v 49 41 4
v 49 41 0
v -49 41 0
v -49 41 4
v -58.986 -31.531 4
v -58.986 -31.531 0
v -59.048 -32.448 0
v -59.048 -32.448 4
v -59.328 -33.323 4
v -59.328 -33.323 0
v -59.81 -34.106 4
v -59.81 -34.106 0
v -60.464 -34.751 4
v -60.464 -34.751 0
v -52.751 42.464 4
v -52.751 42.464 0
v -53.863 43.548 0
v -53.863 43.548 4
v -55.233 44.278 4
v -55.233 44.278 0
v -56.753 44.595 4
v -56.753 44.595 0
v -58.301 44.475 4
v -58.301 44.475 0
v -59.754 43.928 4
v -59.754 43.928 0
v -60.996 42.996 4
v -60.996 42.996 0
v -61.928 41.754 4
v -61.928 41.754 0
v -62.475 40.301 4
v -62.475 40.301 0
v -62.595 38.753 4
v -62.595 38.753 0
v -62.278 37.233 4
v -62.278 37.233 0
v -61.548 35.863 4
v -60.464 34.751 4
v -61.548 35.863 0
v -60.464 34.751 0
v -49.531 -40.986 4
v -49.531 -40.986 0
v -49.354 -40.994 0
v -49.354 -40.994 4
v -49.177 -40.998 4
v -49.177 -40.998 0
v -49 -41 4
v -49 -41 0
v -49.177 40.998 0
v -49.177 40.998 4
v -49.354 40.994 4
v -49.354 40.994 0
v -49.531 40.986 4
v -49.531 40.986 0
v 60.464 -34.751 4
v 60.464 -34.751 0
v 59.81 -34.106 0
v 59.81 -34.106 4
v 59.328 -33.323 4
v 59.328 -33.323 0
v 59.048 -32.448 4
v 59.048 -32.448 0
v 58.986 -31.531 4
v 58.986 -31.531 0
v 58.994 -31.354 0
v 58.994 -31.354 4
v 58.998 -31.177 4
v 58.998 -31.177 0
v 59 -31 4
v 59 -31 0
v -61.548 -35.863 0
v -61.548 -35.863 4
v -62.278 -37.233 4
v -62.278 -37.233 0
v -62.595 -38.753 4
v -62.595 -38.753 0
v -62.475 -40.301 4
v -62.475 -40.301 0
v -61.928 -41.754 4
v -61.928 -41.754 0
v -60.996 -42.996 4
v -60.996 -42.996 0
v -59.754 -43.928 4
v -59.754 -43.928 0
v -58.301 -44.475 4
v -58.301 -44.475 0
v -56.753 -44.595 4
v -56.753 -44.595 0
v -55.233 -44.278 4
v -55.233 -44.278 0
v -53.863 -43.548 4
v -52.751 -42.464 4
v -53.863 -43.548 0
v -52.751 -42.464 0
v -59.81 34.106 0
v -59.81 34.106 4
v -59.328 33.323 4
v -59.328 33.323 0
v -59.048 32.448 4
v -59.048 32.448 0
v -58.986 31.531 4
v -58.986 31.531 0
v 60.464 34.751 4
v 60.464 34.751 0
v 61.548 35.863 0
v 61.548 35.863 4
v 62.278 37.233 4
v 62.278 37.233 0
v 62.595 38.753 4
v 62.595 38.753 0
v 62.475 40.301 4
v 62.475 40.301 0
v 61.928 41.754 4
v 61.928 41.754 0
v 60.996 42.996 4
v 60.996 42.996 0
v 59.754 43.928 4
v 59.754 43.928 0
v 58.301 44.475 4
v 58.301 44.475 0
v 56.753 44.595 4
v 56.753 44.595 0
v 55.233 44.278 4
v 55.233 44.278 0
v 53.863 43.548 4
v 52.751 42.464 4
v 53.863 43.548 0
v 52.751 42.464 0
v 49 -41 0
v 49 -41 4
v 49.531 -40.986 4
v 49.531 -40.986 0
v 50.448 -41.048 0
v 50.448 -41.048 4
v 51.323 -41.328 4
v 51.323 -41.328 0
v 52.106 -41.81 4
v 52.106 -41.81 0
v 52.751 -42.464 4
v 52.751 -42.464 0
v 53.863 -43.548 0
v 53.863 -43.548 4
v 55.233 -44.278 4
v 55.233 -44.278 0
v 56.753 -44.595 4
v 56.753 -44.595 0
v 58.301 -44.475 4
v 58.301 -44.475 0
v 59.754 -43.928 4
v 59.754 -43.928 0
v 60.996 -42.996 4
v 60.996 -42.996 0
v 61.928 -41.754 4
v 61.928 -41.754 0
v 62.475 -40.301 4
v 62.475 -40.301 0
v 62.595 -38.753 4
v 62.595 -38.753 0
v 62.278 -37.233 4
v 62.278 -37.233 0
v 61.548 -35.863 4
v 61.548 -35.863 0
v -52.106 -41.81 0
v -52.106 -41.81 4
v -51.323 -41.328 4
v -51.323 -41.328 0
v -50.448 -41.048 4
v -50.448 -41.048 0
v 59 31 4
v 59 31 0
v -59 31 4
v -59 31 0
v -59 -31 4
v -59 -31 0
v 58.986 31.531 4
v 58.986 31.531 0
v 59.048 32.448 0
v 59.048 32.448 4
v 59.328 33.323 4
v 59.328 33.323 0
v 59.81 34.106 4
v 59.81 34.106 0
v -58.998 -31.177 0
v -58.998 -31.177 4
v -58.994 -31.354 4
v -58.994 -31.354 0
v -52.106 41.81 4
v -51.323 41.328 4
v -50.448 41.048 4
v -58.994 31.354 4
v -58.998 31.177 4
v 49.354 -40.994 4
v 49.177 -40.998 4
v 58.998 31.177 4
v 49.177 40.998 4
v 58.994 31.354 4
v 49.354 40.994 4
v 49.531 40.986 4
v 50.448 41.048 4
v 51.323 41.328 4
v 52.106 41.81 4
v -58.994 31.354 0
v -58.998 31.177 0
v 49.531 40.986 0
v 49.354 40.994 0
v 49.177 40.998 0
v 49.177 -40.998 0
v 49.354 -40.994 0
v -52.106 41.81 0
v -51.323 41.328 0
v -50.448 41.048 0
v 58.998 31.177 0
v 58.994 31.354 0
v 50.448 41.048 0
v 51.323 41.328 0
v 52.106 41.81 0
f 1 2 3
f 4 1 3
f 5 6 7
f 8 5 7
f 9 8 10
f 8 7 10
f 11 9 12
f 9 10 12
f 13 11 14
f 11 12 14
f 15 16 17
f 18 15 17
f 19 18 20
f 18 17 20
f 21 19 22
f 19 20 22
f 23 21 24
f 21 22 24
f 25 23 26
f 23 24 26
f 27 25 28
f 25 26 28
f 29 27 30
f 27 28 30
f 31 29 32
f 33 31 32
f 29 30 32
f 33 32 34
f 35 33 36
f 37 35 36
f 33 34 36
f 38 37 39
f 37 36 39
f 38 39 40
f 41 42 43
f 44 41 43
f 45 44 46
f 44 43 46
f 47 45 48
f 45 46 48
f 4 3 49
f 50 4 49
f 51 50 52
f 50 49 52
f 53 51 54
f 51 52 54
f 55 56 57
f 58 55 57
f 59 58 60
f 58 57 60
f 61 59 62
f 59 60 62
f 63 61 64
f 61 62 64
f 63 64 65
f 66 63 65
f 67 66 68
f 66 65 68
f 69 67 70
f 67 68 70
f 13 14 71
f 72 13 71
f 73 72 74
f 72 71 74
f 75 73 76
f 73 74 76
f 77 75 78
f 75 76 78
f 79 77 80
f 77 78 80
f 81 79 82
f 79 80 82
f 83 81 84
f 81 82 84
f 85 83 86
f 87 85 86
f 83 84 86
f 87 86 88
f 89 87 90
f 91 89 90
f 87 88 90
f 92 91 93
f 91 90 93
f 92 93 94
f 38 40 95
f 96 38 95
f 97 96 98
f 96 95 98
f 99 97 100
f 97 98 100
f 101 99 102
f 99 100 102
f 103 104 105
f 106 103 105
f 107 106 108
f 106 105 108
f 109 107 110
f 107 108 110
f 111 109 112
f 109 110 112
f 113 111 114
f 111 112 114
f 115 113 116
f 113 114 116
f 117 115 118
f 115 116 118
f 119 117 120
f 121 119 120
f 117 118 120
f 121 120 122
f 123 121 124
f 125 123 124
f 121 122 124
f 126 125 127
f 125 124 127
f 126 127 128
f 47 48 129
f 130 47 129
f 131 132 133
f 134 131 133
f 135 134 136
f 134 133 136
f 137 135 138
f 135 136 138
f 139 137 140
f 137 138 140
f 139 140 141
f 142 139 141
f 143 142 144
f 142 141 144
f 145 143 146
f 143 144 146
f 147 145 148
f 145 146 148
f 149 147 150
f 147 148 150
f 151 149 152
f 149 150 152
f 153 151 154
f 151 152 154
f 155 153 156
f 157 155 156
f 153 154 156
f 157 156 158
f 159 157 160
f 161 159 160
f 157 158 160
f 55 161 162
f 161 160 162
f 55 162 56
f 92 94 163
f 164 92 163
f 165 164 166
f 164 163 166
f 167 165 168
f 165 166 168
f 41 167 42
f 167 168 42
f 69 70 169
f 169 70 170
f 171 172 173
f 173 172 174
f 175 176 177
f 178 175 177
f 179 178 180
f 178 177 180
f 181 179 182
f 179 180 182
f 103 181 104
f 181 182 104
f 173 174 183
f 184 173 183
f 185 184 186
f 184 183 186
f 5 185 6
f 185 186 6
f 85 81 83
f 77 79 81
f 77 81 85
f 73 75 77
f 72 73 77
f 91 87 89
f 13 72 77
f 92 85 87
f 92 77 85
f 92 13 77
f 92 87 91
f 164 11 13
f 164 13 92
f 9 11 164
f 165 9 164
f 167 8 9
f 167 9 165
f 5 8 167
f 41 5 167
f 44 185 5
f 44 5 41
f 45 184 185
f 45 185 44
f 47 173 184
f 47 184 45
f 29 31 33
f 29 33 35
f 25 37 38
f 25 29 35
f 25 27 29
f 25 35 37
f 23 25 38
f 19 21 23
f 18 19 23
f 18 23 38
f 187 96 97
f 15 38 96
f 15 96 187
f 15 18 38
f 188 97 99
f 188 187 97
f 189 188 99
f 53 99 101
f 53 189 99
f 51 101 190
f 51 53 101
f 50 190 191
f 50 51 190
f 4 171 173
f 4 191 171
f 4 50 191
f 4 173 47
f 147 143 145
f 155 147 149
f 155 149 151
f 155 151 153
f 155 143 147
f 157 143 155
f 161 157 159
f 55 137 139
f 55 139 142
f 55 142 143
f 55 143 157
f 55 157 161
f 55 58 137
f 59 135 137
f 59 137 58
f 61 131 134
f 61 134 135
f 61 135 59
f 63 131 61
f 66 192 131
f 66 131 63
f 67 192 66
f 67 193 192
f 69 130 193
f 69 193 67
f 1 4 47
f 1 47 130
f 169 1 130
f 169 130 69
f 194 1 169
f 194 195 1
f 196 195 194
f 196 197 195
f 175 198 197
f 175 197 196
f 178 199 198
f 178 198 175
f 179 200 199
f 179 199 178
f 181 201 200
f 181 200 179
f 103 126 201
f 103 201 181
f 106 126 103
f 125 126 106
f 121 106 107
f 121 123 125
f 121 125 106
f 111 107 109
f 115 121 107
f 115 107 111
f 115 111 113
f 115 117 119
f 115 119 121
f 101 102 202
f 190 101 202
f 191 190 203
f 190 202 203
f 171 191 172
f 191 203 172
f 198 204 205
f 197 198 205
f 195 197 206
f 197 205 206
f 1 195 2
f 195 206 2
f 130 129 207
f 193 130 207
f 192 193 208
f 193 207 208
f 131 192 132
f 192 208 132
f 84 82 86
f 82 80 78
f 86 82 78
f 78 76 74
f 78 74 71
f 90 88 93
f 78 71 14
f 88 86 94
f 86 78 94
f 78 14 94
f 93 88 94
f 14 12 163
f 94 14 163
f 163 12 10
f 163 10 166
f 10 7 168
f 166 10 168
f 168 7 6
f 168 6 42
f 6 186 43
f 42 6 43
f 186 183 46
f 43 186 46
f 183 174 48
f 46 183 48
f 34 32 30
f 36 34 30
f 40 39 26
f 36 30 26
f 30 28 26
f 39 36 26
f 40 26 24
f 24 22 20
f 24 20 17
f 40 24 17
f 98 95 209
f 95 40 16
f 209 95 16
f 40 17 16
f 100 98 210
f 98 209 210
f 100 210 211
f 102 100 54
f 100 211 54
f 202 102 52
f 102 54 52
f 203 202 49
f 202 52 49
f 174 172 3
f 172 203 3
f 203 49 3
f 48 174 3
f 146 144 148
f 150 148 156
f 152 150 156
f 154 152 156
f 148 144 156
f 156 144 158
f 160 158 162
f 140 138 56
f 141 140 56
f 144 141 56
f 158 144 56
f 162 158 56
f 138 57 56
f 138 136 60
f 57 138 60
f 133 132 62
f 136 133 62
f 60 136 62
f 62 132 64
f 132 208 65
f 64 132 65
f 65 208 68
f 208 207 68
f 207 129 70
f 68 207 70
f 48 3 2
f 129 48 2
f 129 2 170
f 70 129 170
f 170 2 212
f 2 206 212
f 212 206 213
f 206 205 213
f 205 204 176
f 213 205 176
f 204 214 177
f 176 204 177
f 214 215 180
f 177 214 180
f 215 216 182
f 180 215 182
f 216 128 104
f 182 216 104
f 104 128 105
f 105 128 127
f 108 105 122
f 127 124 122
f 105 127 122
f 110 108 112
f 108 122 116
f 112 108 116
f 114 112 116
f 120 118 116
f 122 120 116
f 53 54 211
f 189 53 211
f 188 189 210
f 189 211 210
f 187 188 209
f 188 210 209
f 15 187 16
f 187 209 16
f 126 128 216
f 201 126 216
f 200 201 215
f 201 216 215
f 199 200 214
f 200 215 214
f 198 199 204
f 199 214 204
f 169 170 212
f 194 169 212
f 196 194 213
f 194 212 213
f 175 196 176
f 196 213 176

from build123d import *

# Parameters (mm, degrees)
BOSS_EXTRUDE1_DEPTH = 4


with BuildPart() as part:
    # Sketch2 → Boss-Extrude1 (new body)
    with BuildSketch(Plane.XY):
        with BuildLine():
            Line((-59, 31), (-59, -31))
            ThreePointArc((-59, -31), (-58.996474756, -31.265504145), (-58.98590151, -31.530821096))
            ThreePointArc((-58.98590151, -31.530821096), (-59.328144398, -33.323028098), (-60.464454078, -34.750591212))
            ThreePointArc((-60.464454078, -34.750591212), (-60.995689014, -42.995689014), (-52.750591212, -42.464454078))
            ThreePointArc((-52.750591212, -42.464454078), (-51.323028098, -41.328144398), (-49.530821096, -40.98590151))
            ThreePointArc((-49.530821096, -40.98590151), (-49.265504145, -40.996474756), (-49, -41))
            Line((-49, -41), (49, -41))
            ThreePointArc((49, -41), (49.265504145, -40.996474756), (49.530821096, -40.98590151))
            ThreePointArc((49.530821096, -40.98590151), (51.323028098, -41.328144398), (52.750591212, -42.464454078))
            ThreePointArc((52.750591212, -42.464454078), (60.995689014, -42.995689014), (60.464454078, -34.750591212))
            ThreePointArc((60.464454078, -34.750591212), (59.328144398, -33.323028098), (58.98590151, -31.530821096))
            ThreePointArc((58.98590151, -31.530821096), (58.996474756, -31.265504145), (59, -31))
            Line((59, -31), (59, 31))
            ThreePointArc((59, 31), (58.996474756, 31.265504145), (58.98590151, 31.530821096))
            ThreePointArc((58.98590151, 31.530821096), (59.328144398, 33.323028098), (60.464454078, 34.750591212))
            ThreePointArc((60.464454078, 34.750591212), (60.995689014, 42.995689014), (52.750591212, 42.464454078))
            ThreePointArc((52.750591212, 42.464454078), (51.323028098, 41.328144398), (49.530821096, 40.98590151))
            ThreePointArc((49.530821096, 40.98590151), (49.265504145, 40.996474756), (49, 41))
            Line((49, 41), (-49, 41))
            ThreePointArc((-49, 41), (-49.265504145, 40.996474756), (-49.530821096, 40.98590151))
            ThreePointArc((-49.530821096, 40.98590151), (-51.323028098, 41.328144398), (-52.750591212, 42.464454078))
            ThreePointArc((-52.750591212, 42.464454078), (-60.995689014, 42.995689014), (-60.464454078, 34.750591212))
            ThreePointArc((-60.464454078, 34.750591212), (-59.328144398, 33.323028098), (-58.98590151, 31.530821096))
            ThreePointArc((-58.98590151, 31.530821096), (-58.996474756, 31.265504145), (-59, 31))
        make_face()
    extrude(amount=BOSS_EXTRUDE1_DEPTH)


solid = part.part
